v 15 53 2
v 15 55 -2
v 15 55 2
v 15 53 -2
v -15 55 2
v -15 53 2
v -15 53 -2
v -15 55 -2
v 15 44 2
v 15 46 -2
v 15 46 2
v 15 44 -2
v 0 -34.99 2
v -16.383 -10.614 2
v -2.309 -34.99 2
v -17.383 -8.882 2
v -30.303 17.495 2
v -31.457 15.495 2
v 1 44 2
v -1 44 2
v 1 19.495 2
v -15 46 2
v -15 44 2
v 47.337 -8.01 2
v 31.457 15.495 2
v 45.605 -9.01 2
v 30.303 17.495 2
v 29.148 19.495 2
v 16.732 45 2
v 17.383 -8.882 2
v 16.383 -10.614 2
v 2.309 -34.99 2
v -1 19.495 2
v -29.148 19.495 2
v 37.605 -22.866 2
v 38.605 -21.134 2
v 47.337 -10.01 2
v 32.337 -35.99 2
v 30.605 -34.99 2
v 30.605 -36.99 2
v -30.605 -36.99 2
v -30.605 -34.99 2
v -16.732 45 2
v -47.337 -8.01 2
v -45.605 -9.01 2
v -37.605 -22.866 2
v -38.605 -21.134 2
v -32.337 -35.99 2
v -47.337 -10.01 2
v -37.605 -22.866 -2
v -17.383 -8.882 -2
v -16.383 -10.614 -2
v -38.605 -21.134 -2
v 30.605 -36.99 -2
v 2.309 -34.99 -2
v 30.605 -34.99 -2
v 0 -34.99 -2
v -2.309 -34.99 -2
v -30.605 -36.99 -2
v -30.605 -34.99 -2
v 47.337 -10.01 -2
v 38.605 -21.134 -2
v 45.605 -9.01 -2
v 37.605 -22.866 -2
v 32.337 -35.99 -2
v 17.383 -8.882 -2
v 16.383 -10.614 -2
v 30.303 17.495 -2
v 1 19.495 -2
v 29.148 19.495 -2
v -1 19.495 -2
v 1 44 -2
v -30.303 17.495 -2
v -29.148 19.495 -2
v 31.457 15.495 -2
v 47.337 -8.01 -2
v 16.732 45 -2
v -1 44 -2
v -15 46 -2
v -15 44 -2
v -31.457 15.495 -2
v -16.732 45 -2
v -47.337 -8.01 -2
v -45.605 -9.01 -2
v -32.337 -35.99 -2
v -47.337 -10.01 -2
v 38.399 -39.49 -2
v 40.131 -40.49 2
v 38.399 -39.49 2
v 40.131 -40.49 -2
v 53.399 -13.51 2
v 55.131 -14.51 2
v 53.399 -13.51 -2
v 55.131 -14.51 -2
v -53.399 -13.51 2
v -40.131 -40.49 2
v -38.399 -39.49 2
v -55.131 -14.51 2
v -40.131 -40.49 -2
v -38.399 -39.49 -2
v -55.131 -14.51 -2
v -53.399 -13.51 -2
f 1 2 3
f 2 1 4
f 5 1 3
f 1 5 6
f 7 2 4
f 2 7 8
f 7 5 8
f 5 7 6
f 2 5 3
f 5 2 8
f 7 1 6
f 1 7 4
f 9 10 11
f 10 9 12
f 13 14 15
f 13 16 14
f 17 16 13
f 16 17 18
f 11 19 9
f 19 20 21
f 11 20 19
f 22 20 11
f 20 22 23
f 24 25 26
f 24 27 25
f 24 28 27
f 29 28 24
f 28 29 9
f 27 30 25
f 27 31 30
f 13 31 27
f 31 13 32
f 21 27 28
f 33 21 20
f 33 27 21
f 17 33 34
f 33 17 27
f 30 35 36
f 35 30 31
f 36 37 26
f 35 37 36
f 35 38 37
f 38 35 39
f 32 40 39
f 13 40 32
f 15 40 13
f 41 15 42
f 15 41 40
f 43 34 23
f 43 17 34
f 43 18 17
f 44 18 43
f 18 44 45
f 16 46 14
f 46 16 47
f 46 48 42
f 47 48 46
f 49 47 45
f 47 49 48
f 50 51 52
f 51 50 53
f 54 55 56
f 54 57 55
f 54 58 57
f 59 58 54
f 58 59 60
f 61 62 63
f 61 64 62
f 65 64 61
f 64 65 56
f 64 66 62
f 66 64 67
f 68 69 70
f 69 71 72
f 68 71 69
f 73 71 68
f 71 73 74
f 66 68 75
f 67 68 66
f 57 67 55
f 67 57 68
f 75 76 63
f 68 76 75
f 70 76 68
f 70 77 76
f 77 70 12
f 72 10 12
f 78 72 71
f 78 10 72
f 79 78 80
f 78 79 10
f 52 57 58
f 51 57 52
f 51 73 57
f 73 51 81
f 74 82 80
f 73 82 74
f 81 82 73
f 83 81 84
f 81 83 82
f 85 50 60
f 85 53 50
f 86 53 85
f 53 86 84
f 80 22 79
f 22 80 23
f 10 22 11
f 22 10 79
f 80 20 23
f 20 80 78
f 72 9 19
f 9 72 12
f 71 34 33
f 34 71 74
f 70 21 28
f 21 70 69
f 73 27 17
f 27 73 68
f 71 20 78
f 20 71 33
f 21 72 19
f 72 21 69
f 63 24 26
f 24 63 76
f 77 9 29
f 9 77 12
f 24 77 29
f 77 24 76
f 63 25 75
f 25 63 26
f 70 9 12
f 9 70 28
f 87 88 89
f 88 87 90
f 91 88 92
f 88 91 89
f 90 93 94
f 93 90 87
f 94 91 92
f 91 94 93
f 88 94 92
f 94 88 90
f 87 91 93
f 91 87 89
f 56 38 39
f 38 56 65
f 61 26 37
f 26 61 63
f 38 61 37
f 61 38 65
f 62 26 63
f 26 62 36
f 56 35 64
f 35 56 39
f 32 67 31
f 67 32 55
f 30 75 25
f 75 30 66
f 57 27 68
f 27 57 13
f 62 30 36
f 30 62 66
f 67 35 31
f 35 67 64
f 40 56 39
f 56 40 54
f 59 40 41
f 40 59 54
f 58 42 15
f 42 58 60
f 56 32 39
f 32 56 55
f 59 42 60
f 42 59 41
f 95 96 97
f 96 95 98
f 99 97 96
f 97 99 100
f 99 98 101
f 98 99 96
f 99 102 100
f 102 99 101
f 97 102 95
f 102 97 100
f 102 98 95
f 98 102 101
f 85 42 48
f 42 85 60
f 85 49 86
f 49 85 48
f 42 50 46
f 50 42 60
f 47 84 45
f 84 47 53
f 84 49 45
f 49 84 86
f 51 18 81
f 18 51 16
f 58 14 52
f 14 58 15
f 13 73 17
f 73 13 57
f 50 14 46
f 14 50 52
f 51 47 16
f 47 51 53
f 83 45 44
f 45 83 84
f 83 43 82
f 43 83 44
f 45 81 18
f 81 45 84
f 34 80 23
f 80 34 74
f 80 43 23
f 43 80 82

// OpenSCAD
// Generated by SolidPython 1.1.3 on 2023-10-14 12:32:42
$fn = 48;


union() {
	union() {
		translate(v = [ 0.,54., 0.]) {
			rotate(a = [0, 0, -0.0000000000]) {
				cube(center = true, size = [30, 2, 4]);
			}
		}
	}
	union() {
		translate(v = [ 0.,45., 0.]) {
			rotate(a = [0, 0, -0.0000000000]) {
				cube(center = true, size = [30, 2, 4]);
			}
		}
	}
	union() {
		translate(v = [ 0.        ,18.49519053, 0.        ]) {
			rotate(a = [0, 0, -0.0000000000]) {
				cube(center = true, size = [60.605117766515306, 2, 4]);
			}
		}
	}
	union() {
		translate(v = [ 0.        ,31.74759526, 0.        ]) {
			rotate(a = [0, 0, 90.0000000000]) {
				cube(center = true, size = [26.504809471616706, 2, 4]);
			}
		}
	}
	union() {
		translate(v = [31.16858429,17.99519053, 0.        ]) {
			rotate(a = [0, 0, -60.0000000000]) {
				cube(center = true, size = [61.2102355330306, 2, 4]);
			}
		}
	}
	union() {
		translate(v = [ 46.7653718,-27.       ,  0.       ]) {
			rotate(a = [0, 0, -120.0000000000]) {
				cube(center = true, size = [30, 2, 4]);
			}
		}
	}
	union() {
		translate(v = [ 38.97114317,-22.5       ,  0.        ]) {
			rotate(a = [0, 0, -120.0000000000]) {
				cube(center = true, size = [30, 2, 4]);
			}
		}
	}
	union() {
		translate(v = [16.01730485,-9.24759526, 0.        ]) {
			rotate(a = [0, 0, -120.0000000000]) {
				cube(center = true, size = [60.605117766515306, 2, 4]);
			}
		}
	}
	union() {
		translate(v = [ 27.49422401,-15.87379763,  0.        ]) {
			rotate(a = [0, 0, -30.0000000000]) {
				cube(center = true, size = [26.504809471616706, 2, 4]);
			}
		}
	}
	union() {
		translate(v = [ 4.40755050e-15,-3.59903811e+01, 0.00000000e+00]) {
			rotate(a = [0, 0, -180.0000000000]) {
				cube(center = true, size = [61.2102355330306, 2, 4]);
			}
		}
	}
	union() {
		translate(v = [-46.7653718,-27.       ,  0.       ]) {
			rotate(a = [0, 0, -240.0000000000]) {
				cube(center = true, size = [30, 2, 4]);
			}
		}
	}
	union() {
		translate(v = [-38.97114317,-22.5       ,  0.        ]) {
			rotate(a = [0, 0, -240.0000000000]) {
				cube(center = true, size = [30, 2, 4]);
			}
		}
	}
	union() {
		translate(v = [-16.01730485, -9.24759526,  0.        ]) {
			rotate(a = [0, 0, -240.0000000000]) {
				cube(center = true, size = [60.605117766515306, 2, 4]);
			}
		}
	}
	union() {
		translate(v = [-27.49422401,-15.87379763,  0.        ]) {
			rotate(a = [0, 0, -150.0000000000]) {
				cube(center = true, size = [26.504809471616706, 2, 4]);
			}
		}
	}
	union() {
		translate(v = [-31.16858429, 17.99519053,  0.        ]) {
			rotate(a = [0, 0, -300.0000000000]) {
				cube(center = true, size = [61.2102355330306, 2, 4]);
			}
		}
	}
}
/***********************************************
*********      SolidPython code:      **********
************************************************
 
#! /usr/bin/env python3
import sys
import numpy as np
from solid import scad_render_to_file
from solid.objects import cube, translate, union, rotate

SEGMENTS = 48

radial_vector0 = np.array([ 31., -19., 0.])
radial_vector0 /= np.linalg.norm(radial_vector0)
radial_vector1 = np.array([-31., -19., 0.])
radial_vector1 /= np.linalg.norm(radial_vector1)

side_count = 3
step_angle = 360/side_count
step_angle_rad = np.deg2rad(step_angle)
rad_size = 30 # Length from center to outer wheel

wheel_gap = 9
ctiw = 44 # Center to inner wheel support
ctow = wheel_gap+ctiw # Center to outer wheel support
wsl = 30 # Wheel support length

p1 = np.array([wsl*.5, ctiw, 0.])
p2 = np.array([np.sin(step_angle_rad), np.cos(step_angle_rad), 0.]) * ctiw - np.array([np.sin(step_angle_rad+np.pi*.5), np.cos(step_angle_rad+np.pi*.5), 0.]) * wsl*.5
boll = np.linalg.norm(p1-p2) # Big outer lines length
bolr = np.linalg.norm((p1+p2)*.5)# Big outer lines rad length

# Circular inner support
p3 = (p1+p2)*.5
p2 = np.array([-np.sin(step_angle_rad), np.cos(step_angle_rad), 0.]) * ctiw - np.array([-np.sin(step_angle_rad+np.pi*.5), np.cos(step_angle_rad+np.pi*.5), 0.]) * wsl*.5
p1 = np.array([-wsl*.5, ctiw, 0.])
p4 = (p1+p2)*.5
cil = np.linalg.norm(p3-p4) # Big outer lines length
cir = np.linalg.norm((p3+p4)*.5)# Big outer lines rad length

# Radial connections
p1 = np.array([0, ctiw, 0.])
p2 = (p4+p3)*.5
rcl = np.linalg.norm(p1-p2)
rcr = np.linalg.norm((p1+p2)*.5)

def basic_geometry():

    shapes = []
    for i in range(side_count):
        dir_vector = np.array([np.sin(i*step_angle_rad), np.cos(i*step_angle_rad), 0.])
        rot = -step_angle*i
        outer_wheel_support = union()(
                                translate(dir_vector*(ctow+1))(
                                    rotate((0, 0, rot))(
                                        cube([wsl, 2, 4], center=True))))
        shapes.append(outer_wheel_support)
        inner_wheel_support = union()(
                                translate(dir_vector*(ctiw+1))(
                                    rotate((0, 0, rot))(
                                        cube([wsl, 2, 4], center=True))))
        shapes.append(inner_wheel_support)

        inner_circle = union()(
                            translate(dir_vector*(cir+1))(
                                rotate((0, 0, rot))(
                                    cube([cil, 2, 4], center=True))))
        shapes.append(inner_circle)

        radial_support = union()(
                            translate(dir_vector*(rcr+1))(
                                rotate((0, 0, rot+90))(
                                    cube([rcl, 2, 4], center=True))))
        shapes.append(radial_support)

        dir_vector = np.array([np.sin(i*step_angle_rad+step_angle_rad*.5), np.cos(i*step_angle_rad+step_angle_rad*.5), 0.])
        rot -= step_angle*.5
        big_outer_line = union()(
                            translate(dir_vector*(bolr+1))(
                                rotate((0, 0, rot))(
                                    cube([boll, 2, 4], center=True))))
        shapes.append(big_outer_line)

    return union()(*shapes)

if __name__ == '__main__':
    out_dir = sys.argv[1] if len(sys.argv) > 1 else None

    a = basic_geometry()

    # Adding the file_header argument as shown allows you to change
    # the detail of arcs by changing the SEGMENTS variable.  This can
    # be expensive when making lots of small curves, but is otherwise
    # useful.
    file_out = scad_render_to_file(a, out_dir=out_dir, file_header=f'$fn = {SEGMENTS};')
    print(f"{__file__}: SCAD file written to: \n{file_out}")
 
 
************************************************/
